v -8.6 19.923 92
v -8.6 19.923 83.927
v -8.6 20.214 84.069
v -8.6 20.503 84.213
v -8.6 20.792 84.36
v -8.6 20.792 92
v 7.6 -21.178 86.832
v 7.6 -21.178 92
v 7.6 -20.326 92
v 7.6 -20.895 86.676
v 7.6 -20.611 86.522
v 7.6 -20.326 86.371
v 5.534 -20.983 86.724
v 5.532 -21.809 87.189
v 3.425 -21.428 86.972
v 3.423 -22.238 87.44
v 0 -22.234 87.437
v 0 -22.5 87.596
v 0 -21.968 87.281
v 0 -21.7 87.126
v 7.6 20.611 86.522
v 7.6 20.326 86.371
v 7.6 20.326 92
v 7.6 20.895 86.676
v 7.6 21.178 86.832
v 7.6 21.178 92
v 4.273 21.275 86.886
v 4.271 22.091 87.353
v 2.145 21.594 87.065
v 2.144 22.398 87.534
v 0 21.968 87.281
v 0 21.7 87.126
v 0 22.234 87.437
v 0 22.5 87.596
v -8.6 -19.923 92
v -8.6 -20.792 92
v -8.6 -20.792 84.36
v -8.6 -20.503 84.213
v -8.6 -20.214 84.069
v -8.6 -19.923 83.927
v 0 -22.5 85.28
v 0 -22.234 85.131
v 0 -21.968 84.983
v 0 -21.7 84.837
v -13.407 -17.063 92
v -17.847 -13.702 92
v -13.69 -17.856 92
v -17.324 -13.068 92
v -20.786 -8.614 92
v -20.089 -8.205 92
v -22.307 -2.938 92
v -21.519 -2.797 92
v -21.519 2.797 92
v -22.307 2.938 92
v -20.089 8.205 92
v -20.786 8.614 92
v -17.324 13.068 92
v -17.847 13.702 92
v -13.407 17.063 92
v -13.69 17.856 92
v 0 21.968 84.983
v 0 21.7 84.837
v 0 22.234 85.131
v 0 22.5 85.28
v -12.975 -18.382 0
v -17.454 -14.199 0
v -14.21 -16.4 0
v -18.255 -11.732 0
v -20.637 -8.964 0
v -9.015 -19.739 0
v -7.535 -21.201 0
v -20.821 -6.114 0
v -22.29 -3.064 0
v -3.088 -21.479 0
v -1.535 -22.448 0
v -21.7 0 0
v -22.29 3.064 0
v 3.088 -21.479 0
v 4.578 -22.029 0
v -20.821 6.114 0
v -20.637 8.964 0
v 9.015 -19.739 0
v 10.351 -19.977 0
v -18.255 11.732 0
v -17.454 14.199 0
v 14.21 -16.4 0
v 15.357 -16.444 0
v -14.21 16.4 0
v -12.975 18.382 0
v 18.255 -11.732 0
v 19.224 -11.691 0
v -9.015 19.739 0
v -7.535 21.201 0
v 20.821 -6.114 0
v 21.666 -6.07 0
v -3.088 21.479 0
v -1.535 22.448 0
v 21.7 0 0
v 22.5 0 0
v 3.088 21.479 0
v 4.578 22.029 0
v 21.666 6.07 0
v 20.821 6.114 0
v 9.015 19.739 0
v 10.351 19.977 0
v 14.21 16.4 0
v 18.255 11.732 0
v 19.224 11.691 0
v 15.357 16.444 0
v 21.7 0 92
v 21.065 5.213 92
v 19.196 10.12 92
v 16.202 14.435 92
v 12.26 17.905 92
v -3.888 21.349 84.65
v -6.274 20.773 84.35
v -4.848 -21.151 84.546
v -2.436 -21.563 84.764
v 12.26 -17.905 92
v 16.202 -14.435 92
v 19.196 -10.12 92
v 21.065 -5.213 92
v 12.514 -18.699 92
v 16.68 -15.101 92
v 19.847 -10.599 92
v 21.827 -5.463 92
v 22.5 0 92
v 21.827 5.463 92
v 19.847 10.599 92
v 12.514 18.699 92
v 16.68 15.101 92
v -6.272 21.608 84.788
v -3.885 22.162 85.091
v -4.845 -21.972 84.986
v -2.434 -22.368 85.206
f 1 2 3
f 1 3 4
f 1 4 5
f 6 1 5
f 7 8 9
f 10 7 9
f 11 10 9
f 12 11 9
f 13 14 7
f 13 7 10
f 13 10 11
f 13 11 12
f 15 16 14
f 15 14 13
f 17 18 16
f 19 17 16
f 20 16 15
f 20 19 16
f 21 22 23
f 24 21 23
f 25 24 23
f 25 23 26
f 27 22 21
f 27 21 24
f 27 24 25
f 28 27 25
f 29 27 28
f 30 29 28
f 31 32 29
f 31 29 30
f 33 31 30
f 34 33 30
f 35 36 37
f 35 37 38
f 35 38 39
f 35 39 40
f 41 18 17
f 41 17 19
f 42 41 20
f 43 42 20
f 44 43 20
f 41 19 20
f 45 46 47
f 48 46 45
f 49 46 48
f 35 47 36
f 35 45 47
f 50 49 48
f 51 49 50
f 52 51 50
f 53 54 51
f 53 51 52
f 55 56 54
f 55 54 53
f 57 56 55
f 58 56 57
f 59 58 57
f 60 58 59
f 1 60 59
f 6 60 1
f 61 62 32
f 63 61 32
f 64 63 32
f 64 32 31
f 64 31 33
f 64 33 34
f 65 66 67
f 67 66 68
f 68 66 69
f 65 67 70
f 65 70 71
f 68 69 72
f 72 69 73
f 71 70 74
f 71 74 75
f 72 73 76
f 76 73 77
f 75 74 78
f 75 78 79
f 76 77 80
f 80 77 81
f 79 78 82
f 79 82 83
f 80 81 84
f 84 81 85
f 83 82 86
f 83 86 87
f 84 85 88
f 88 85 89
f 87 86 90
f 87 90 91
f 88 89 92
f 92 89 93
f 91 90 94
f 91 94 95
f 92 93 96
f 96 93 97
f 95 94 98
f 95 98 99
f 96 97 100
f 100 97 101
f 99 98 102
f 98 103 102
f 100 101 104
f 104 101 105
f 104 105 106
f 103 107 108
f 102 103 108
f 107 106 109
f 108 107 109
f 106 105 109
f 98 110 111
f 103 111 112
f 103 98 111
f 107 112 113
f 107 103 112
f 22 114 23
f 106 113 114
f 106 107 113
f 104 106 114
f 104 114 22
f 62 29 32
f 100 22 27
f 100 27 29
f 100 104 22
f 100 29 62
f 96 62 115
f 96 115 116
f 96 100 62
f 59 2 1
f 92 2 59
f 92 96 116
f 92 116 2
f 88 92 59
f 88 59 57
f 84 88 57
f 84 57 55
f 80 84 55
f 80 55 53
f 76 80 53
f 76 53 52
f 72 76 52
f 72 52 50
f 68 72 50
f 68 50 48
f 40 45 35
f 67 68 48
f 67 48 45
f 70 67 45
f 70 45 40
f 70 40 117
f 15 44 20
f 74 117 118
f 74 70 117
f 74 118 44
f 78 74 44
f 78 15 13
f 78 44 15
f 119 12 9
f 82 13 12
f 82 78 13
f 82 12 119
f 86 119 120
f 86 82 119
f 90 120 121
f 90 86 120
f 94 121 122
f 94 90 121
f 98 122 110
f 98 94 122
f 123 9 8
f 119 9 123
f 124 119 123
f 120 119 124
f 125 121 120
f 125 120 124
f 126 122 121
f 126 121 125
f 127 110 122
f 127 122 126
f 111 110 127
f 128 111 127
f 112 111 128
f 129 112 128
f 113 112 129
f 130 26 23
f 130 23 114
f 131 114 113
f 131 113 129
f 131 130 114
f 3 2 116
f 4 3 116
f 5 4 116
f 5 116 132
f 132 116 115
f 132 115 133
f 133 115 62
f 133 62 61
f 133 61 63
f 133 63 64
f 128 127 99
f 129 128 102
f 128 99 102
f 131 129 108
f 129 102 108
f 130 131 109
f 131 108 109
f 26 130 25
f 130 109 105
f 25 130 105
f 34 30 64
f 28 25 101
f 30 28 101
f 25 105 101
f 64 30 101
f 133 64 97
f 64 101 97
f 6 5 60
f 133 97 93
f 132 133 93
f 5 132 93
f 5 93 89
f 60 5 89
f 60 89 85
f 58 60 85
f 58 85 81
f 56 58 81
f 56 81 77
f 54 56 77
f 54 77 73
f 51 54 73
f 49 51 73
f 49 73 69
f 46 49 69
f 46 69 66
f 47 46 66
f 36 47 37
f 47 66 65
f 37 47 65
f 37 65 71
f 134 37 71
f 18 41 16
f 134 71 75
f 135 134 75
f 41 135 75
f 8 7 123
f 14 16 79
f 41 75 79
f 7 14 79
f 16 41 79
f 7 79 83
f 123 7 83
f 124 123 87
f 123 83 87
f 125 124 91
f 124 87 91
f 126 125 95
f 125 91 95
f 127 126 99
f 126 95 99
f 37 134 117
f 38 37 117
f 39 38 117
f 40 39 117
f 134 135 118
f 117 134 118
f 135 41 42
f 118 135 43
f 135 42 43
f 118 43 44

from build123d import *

# Parameters (mm, degrees)
SKETCH1_R           = 22.499999958
SKETCH1_R_2         = 21.699999958
BOSS_EXTRUDE1_DEPTH = 92
SKETCH3_R           = 45.65
CUT_EXTRUDE1_DEPTH  = 8.6
SKETCH3_3_R         = 43.65
CUT_EXTRUDE2_DEPTH  = 7.6


with BuildPart() as part:
    # Sketch1 → Boss-Extrude1 (new body)
    with BuildSketch(Plane(origin=(0, 0, 0), x_dir=(0, 1, 0), z_dir=(0, 0, 1))):
        with Locations(Location((0, 0, 0), (0, 0, 270))):
            Circle(SKETCH1_R)
        with Locations(Location((0, 0, 0), (0, 0, 270))):
            Circle(SKETCH1_R_2, mode=Mode.SUBTRACT)
    extrude(amount=BOSS_EXTRUDE1_DEPTH)

    # Sketch3 → Cut-Extrude1 (cut)
    with BuildSketch(Plane.YZ):
        with Locations((0, 125)):
            Circle(SKETCH3_R)
    extrude(amount=-CUT_EXTRUDE1_DEPTH, mode=Mode.SUBTRACT)

    # Sketch3<3> → Cut-Extrude2 (cut)
    with BuildSketch(Plane.YZ):
        with Locations((0, 125)):
            Circle(SKETCH3_3_R)
    extrude(amount=CUT_EXTRUDE2_DEPTH, mode=Mode.SUBTRACT)


solid = part.part
